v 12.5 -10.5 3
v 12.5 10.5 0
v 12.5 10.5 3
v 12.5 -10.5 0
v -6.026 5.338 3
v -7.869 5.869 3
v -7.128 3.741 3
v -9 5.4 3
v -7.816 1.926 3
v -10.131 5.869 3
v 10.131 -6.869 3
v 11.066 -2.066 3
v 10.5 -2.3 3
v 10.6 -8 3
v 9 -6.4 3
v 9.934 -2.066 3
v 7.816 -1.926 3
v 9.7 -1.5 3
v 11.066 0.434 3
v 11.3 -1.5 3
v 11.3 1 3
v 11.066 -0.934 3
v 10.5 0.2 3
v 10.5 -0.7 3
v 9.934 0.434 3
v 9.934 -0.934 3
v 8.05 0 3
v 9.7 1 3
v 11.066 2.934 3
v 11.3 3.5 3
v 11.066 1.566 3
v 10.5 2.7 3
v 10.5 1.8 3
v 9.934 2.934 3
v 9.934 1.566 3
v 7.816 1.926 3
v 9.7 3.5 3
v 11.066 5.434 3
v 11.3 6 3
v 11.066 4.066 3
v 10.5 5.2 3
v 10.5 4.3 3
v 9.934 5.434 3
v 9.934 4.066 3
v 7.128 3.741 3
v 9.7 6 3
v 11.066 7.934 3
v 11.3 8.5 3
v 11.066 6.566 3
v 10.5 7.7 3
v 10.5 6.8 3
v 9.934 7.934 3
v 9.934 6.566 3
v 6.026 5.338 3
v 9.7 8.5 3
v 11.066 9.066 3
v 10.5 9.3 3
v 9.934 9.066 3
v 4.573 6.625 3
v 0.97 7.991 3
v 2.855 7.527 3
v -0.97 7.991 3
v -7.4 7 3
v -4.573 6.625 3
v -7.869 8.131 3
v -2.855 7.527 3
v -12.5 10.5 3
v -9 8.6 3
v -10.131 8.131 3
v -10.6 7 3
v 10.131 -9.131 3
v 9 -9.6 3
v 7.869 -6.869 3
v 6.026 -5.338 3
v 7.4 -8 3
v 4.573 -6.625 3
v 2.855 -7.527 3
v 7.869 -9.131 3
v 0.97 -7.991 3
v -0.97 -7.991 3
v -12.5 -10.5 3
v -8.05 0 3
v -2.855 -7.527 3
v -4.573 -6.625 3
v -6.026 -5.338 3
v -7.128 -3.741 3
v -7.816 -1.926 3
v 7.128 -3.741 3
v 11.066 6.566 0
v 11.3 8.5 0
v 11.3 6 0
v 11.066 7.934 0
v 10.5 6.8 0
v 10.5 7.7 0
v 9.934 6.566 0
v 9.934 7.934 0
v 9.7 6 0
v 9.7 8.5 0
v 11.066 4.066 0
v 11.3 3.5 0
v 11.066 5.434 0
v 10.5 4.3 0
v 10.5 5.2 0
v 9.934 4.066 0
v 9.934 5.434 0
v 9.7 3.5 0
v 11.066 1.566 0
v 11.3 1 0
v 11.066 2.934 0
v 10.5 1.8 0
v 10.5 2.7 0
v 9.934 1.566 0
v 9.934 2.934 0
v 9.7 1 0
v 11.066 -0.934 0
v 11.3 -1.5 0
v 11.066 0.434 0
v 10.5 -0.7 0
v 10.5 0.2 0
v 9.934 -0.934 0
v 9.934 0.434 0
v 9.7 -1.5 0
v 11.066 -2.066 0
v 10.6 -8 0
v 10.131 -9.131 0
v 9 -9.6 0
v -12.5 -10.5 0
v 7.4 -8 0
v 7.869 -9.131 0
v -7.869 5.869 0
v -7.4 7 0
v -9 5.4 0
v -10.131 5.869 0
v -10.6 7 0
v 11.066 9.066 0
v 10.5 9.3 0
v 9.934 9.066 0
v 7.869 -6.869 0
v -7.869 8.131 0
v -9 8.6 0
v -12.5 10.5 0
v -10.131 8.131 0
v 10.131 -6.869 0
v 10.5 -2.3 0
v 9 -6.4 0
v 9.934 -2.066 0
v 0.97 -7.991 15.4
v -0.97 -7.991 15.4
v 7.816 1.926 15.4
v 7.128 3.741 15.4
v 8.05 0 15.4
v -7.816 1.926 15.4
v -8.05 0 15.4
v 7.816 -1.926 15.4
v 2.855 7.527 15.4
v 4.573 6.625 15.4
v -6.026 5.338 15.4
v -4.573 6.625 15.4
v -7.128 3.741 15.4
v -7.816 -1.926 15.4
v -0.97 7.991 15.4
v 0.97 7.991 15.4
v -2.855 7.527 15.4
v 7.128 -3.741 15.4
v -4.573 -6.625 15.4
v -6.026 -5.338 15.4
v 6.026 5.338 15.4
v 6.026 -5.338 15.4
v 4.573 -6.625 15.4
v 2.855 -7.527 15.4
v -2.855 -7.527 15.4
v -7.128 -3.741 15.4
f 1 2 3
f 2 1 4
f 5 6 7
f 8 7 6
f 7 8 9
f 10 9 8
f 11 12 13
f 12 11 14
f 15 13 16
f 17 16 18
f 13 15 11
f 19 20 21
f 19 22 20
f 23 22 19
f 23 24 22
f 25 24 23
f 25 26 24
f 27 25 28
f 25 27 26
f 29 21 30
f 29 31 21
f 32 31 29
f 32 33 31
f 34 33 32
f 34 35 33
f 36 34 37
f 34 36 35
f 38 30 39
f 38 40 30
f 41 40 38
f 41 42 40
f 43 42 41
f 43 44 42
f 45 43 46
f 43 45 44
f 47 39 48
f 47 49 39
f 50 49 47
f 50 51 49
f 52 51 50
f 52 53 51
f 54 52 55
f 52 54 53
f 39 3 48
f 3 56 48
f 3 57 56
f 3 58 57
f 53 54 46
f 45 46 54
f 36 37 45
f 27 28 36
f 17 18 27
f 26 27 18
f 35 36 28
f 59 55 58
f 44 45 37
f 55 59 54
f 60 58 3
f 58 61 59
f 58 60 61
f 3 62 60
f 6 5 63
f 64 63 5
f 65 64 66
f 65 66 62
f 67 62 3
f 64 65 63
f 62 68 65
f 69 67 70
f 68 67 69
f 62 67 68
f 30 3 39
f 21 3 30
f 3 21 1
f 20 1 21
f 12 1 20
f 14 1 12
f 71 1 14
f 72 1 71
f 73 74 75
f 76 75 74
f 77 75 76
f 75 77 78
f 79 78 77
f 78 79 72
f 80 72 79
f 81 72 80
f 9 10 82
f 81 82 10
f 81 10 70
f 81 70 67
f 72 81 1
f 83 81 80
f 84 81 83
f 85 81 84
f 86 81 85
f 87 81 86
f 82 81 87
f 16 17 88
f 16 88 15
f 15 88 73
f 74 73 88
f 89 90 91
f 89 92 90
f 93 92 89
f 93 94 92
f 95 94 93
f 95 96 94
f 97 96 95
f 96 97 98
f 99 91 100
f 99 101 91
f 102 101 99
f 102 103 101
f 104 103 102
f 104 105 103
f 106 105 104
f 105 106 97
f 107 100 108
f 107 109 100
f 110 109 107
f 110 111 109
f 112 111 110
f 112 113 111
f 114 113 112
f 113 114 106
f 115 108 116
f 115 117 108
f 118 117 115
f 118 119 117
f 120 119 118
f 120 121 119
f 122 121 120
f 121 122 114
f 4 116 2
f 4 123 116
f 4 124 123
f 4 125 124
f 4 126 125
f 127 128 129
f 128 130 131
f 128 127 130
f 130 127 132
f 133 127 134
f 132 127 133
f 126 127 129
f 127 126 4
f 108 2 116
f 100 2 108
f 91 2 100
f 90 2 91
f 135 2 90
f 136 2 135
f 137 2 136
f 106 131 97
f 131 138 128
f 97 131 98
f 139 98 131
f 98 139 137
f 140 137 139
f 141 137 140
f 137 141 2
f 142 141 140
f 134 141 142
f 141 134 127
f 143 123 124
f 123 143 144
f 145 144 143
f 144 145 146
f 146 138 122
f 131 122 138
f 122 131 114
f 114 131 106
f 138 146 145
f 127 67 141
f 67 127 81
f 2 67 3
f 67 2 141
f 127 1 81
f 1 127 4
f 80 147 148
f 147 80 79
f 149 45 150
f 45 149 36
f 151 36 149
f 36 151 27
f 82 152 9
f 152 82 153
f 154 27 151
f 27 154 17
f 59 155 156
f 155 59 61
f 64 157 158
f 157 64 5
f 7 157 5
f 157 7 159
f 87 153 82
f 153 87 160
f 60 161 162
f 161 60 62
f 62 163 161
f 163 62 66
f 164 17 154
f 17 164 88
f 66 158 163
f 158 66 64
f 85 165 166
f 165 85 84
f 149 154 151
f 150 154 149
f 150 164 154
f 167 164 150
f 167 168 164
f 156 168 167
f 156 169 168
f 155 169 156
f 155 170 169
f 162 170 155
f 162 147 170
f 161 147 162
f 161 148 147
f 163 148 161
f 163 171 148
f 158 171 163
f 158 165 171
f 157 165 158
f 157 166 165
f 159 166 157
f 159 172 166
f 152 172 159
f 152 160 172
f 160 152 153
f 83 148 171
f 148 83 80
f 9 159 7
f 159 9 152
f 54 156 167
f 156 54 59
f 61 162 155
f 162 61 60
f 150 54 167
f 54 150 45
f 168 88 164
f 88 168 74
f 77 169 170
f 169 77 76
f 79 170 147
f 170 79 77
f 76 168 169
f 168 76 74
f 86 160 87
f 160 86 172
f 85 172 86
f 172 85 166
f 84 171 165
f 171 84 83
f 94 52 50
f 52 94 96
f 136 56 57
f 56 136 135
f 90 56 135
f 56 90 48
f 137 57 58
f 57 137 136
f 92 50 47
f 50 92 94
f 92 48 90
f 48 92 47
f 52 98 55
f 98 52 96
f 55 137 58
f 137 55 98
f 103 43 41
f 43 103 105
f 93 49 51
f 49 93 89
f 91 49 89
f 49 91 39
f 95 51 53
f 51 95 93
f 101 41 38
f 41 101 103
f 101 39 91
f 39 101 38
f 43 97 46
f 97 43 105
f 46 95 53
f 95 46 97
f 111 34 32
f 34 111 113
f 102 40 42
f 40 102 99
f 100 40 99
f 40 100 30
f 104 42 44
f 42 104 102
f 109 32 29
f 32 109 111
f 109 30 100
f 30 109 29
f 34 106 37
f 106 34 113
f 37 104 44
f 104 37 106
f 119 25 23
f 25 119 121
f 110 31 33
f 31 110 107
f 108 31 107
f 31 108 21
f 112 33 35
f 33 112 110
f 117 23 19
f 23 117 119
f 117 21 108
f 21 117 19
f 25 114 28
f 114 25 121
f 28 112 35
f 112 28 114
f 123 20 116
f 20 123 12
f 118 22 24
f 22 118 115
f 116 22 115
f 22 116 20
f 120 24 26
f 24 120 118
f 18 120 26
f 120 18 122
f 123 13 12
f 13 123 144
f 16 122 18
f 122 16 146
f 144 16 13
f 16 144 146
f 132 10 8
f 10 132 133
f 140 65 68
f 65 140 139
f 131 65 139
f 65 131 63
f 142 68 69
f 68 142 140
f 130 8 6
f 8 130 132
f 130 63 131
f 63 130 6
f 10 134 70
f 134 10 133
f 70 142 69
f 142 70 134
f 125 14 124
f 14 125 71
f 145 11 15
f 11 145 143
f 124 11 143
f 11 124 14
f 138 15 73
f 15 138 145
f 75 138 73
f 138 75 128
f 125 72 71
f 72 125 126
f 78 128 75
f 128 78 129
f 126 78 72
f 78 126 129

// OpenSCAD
// file: configuration.scad
//------------------------------------
//-- Miniskybot 2 configuration file
//------------------------------------

//-- drills
drill_M3 = 3.2;

//-- captive Nuts
nut_h = 2.6;
nut_radius = 6.6/2;

//------------------------------------------------
//-- Servo parameters
//-- See the doc/futaba-doc2.dxf file
//------------------------------------------------
//-- Servo futaba 3003 dimensions
servo_c1 = 20;
servo_c2 = 7.5;
servo_c3 = 26.4;
servo_c4 = 40.3;
servo_c5 = 30.3;
servo_c6 = 10;
servo_c7 = 11.6;
servo_c8 = 4.1;
servo_c9 = 5.2;
servo_c10 = 9.6;

//-------------------------------------------
//-- Battery holder parameters
//-- See the doc/battery_holder.dxf file
//-------------------------------------------
battery_c1 = 49;
battery_c2 = 51.5;
battery_c3 = 12;
battery_ear_diam = 9;
battery_ear_h = 3;
battery_top_gap = 1;  
//-- Real battery height whith batteries inserted
battery_height = battery_c3 + battery_top_gap;

//----------------------------------
//-- Rear part parameters
//-- See the doc/rear-doc.dxf file
//----------------------------------
rear_c1 = servo_c2 + 3;
rear_c2 = servo_c3*2;
rear_c3 = servo_c1 + battery_height -battery_ear_h;
rear_edge_rad = 3;

//-- Ball caster parameters
WallThickness = 2.25; //thickness of the retaining wall
BallSize = 16.4;  //diameter of  your ball bearing.
Airgap = .65;  // Gap between ball and wall  
BallProtrude = .35; //percentage of ball radius sticking out 
WheelDiameter = 56;  //what size wheels you will use.

//-- Wheels parameters
wheels_diam = 56;
wheel_height = 6;
wheel_gap = 1;

//-- ultrasounds
ultrasound_hole = 16.5;
ultrasound_base_lx = 24+1;
ultrasound_base_ly = 20+1;
ultrasound_base_lz = 3;
ultrasound_length = 12.5;
ultrasound_drill_1 = [-9,7,0];
ultrasound_drill_2 = [9,-8,0];
// main file
include <configuration.scad>

module fake_ultrasound_srf02()
{

  difference() {

    //-- ultrasound + base board
    union() {

      //-- board
      color("green")
      translate([0,0,ultrasound_base_lz/2])
      cube([ultrasound_base_lx, ultrasound_base_ly, ultrasound_base_lz],center=true);

      //-- Sensor
      color("gray")
      translate([0,0,ultrasound_length/2+ultrasound_base_lz-0.1])
      cylinder(r=ultrasound_hole/2-0.2, h=ultrasound_length,center=true);
    }

    //-- Drill 1
    translate(ultrasound_drill_1)
    cylinder(r=drill_M3/2, h=20,center=true,$fn=8);

    //-- Drill 2
    translate(ultrasound_drill_2)
    cylinder(r=drill_M3/2, h=20,center=true,$fn=8);

    //-- Electrical conections
    for (i=[0:4]) {
      translate([ultrasound_base_lx/2-2, ultrasound_base_ly/2-2-2.5*i,0])
      cylinder(r=0.8, h=20, center=true, $fn=8);  
    }

  }

}

fake_ultrasound_srf02();
